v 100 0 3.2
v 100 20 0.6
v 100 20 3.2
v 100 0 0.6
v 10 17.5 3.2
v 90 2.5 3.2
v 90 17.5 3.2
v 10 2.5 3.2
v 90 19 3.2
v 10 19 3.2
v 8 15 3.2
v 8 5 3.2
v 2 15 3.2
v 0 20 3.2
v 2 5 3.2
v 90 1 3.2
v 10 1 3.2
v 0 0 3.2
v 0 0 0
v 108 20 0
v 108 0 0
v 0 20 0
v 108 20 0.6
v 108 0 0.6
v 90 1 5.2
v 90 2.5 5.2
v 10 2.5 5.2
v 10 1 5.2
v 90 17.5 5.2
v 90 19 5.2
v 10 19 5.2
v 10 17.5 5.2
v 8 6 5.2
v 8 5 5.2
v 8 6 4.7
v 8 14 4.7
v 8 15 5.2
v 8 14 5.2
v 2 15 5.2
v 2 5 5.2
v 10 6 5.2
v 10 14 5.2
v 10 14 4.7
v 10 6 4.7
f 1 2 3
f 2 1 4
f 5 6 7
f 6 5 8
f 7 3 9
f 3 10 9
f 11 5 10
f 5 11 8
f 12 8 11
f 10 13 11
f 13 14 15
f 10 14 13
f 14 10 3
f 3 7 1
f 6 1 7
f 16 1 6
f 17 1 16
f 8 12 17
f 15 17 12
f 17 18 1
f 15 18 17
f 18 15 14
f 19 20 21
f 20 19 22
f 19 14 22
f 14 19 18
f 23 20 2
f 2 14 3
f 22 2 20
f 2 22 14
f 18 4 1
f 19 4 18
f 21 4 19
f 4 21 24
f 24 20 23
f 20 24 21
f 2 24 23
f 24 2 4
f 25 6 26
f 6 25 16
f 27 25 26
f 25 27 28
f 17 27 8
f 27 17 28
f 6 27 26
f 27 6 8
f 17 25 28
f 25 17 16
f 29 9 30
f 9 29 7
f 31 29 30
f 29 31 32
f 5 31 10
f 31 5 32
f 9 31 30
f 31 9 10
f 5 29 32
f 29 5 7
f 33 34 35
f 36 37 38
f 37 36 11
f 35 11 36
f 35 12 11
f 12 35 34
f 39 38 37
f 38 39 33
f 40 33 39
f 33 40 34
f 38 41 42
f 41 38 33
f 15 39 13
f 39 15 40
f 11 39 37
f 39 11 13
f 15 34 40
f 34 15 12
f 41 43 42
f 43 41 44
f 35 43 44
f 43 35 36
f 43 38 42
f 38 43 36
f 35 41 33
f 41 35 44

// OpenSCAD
// Bag clip with living hinge - PETG, 0.4mm nozzle, no supports
// One piece concept shown as two contacting halves printed open flat.
// Lower arm + upper arm meet at hinge mid-plane.
// Fold map (180 about pivot): F(x) = 216 - x, F(z) = 10.4 - z.

part = "arm_lower"; // [arm_lower, arm_upper, assembly]
cadverify_only = "";

Lbody = 100;
Wbody = 20;
Tbody = 3.2;
Hhalf = 8;
Thinge = 0.6;
Bgap = 2.0;
Xpiv = 108;
Zpiv = 5.2;

module instance(name, part, unit = 1) {
    echo(cadverify_instance = [name, part, unit]);
    if (cadverify_only == "" || cadverify_only == name) children();
}

module arm_lower() {
    cube([Lbody, Wbody, Tbody], false);
    translate([Lbody-0.1, 0, 0])
        cube([Hhalf+0.1, Wbody, Thinge], false);
    translate([10, 1, Tbody-0.1])
        cube([80, 1.5, Bgap+0.1], false);
    translate([10, 17.5, Tbody-0.1])
        cube([80, 1.5, Bgap+0.1], false);
    translate([2, 5, Tbody-0.1])
        cube([6, 10, Bgap+0.1], false);
    translate([7.9, 6, 4.7])
        cube([2.1, 8, 0.5], false);
}

module arm_upper() {
    cube([Hhalf+0.1, Wbody, Thinge], false);
    translate([Hhalf-0.1, 0, 0])
        cube([Lbody+0.1, Wbody, Tbody], false);
    translate([100, 5, Tbody-0.1])
        cube([6, 10, Bgap+0.1], false);
    translate([97.9, 6, 4.7])
        cube([2.5, 8, 0.5], false);
    translate([107.9, 6, 0])
        cube([8.1, 8, Tbody], false);
}

if (part == "arm_lower") {
    echo(cadverify_spec = [
        ["bounds", [[0, 0, 0], [108, 20, 5.2]]],
        ["bodies", 1],
        ["through_holes", 0],
        ["support_faces", [["bed", "-z", 1500]]],
        ["overhangs_allowed", [["latch lip", [[7.5, 5.5, 4.5], [10.5, 14.5, 5.5]]]]],
        ["copies", 1],
        ["details", [
            ["arm", "material", [[20, 6, 1.0], [80, 14, 2.2]], 1],
            ["arm_wall", "thickness", [50, 10, 10], [0, 0, -1], 3.2],
            ["hinge", "thickness", [104, 10, 5], [0, 0, -1], 0.6],
            ["rib", "material", [[20, 1.2, 3.5], [80, 2.3, 5.0]], 1],
            ["rib2", "material", [[20, 17.7, 3.5], [80, 18.8, 5.0]], 1],
            ["latch_tower", "material", [[3, 6, 3.5], [7, 14, 5.0]], 1],
            ["latch_lip", "material", [[8.2, 7, 4.8], [9.7, 13, 5.1]], 1],
            ["bag_slot", "void", [[20, 3, 3.5], [80, 17, 5.0]], 1]
        ]]
    ]);
    arm_lower();
} else if (part == "arm_upper") {
    echo(cadverify_spec = [
        ["bounds", [[0, 0, 0], [116, 20, 5.2]]],
        ["bodies", 1],
        ["through_holes", 0],
        ["support_faces", [["bed", "-z", 1500]]],
        ["overhangs_allowed", [["latch lip", [[97.5, 5.5, 4.5], [100.8, 14.5, 5.5]]]]],
        ["copies", 1],
        ["details", [
            ["arm", "material", [[15, 6, 1.0], [80, 14, 2.2]], 0.99],
            ["arm_wall", "thickness", [50, 10, 10], [0, 0, -1], 3.2],
            ["hinge", "thickness", [4, 10, 5], [0, 0, -1], 0.6],
            ["latch_tower", "material", [[100.5, 6, 3.5], [105.5, 14, 5.0]], 1],
            ["latch_lip", "material", [[98.2, 7, 4.8], [100.1, 13, 5.1]], 1],
            ["thumb_tab", "material", [[108.5, 7, 1.0], [115, 13, 2.2]], 1],
            ["field", "void", [[15, 3, 3.5], [80, 17, 5.0]], 1]
        ]]
    ]);
    arm_upper();
} else if (part == "assembly") {
    echo(cadverify_spec = [
        ["bounds", [[0, 0, 0], [224, 20, 5.2]]],
        ["support_faces", [["bed", "-z", 3000]]],
        ["motions", [
            ["close", ["upper"], "rotate", [108, 10, 5.2], [0, -1, 0], [0, 180],
                ["stops", [180]],
                ["rests", [0, 180]]
            ]
        ]],
        ["assembly_order", [
            [["lower"], [0, 0, 0]],
            [["upper"], [0, 0, -1]]
        ]]
    ]);
    instance("lower", "arm_lower") arm_lower();
    instance("upper", "arm_upper") translate([108, 0, 0]) arm_upper();
}
